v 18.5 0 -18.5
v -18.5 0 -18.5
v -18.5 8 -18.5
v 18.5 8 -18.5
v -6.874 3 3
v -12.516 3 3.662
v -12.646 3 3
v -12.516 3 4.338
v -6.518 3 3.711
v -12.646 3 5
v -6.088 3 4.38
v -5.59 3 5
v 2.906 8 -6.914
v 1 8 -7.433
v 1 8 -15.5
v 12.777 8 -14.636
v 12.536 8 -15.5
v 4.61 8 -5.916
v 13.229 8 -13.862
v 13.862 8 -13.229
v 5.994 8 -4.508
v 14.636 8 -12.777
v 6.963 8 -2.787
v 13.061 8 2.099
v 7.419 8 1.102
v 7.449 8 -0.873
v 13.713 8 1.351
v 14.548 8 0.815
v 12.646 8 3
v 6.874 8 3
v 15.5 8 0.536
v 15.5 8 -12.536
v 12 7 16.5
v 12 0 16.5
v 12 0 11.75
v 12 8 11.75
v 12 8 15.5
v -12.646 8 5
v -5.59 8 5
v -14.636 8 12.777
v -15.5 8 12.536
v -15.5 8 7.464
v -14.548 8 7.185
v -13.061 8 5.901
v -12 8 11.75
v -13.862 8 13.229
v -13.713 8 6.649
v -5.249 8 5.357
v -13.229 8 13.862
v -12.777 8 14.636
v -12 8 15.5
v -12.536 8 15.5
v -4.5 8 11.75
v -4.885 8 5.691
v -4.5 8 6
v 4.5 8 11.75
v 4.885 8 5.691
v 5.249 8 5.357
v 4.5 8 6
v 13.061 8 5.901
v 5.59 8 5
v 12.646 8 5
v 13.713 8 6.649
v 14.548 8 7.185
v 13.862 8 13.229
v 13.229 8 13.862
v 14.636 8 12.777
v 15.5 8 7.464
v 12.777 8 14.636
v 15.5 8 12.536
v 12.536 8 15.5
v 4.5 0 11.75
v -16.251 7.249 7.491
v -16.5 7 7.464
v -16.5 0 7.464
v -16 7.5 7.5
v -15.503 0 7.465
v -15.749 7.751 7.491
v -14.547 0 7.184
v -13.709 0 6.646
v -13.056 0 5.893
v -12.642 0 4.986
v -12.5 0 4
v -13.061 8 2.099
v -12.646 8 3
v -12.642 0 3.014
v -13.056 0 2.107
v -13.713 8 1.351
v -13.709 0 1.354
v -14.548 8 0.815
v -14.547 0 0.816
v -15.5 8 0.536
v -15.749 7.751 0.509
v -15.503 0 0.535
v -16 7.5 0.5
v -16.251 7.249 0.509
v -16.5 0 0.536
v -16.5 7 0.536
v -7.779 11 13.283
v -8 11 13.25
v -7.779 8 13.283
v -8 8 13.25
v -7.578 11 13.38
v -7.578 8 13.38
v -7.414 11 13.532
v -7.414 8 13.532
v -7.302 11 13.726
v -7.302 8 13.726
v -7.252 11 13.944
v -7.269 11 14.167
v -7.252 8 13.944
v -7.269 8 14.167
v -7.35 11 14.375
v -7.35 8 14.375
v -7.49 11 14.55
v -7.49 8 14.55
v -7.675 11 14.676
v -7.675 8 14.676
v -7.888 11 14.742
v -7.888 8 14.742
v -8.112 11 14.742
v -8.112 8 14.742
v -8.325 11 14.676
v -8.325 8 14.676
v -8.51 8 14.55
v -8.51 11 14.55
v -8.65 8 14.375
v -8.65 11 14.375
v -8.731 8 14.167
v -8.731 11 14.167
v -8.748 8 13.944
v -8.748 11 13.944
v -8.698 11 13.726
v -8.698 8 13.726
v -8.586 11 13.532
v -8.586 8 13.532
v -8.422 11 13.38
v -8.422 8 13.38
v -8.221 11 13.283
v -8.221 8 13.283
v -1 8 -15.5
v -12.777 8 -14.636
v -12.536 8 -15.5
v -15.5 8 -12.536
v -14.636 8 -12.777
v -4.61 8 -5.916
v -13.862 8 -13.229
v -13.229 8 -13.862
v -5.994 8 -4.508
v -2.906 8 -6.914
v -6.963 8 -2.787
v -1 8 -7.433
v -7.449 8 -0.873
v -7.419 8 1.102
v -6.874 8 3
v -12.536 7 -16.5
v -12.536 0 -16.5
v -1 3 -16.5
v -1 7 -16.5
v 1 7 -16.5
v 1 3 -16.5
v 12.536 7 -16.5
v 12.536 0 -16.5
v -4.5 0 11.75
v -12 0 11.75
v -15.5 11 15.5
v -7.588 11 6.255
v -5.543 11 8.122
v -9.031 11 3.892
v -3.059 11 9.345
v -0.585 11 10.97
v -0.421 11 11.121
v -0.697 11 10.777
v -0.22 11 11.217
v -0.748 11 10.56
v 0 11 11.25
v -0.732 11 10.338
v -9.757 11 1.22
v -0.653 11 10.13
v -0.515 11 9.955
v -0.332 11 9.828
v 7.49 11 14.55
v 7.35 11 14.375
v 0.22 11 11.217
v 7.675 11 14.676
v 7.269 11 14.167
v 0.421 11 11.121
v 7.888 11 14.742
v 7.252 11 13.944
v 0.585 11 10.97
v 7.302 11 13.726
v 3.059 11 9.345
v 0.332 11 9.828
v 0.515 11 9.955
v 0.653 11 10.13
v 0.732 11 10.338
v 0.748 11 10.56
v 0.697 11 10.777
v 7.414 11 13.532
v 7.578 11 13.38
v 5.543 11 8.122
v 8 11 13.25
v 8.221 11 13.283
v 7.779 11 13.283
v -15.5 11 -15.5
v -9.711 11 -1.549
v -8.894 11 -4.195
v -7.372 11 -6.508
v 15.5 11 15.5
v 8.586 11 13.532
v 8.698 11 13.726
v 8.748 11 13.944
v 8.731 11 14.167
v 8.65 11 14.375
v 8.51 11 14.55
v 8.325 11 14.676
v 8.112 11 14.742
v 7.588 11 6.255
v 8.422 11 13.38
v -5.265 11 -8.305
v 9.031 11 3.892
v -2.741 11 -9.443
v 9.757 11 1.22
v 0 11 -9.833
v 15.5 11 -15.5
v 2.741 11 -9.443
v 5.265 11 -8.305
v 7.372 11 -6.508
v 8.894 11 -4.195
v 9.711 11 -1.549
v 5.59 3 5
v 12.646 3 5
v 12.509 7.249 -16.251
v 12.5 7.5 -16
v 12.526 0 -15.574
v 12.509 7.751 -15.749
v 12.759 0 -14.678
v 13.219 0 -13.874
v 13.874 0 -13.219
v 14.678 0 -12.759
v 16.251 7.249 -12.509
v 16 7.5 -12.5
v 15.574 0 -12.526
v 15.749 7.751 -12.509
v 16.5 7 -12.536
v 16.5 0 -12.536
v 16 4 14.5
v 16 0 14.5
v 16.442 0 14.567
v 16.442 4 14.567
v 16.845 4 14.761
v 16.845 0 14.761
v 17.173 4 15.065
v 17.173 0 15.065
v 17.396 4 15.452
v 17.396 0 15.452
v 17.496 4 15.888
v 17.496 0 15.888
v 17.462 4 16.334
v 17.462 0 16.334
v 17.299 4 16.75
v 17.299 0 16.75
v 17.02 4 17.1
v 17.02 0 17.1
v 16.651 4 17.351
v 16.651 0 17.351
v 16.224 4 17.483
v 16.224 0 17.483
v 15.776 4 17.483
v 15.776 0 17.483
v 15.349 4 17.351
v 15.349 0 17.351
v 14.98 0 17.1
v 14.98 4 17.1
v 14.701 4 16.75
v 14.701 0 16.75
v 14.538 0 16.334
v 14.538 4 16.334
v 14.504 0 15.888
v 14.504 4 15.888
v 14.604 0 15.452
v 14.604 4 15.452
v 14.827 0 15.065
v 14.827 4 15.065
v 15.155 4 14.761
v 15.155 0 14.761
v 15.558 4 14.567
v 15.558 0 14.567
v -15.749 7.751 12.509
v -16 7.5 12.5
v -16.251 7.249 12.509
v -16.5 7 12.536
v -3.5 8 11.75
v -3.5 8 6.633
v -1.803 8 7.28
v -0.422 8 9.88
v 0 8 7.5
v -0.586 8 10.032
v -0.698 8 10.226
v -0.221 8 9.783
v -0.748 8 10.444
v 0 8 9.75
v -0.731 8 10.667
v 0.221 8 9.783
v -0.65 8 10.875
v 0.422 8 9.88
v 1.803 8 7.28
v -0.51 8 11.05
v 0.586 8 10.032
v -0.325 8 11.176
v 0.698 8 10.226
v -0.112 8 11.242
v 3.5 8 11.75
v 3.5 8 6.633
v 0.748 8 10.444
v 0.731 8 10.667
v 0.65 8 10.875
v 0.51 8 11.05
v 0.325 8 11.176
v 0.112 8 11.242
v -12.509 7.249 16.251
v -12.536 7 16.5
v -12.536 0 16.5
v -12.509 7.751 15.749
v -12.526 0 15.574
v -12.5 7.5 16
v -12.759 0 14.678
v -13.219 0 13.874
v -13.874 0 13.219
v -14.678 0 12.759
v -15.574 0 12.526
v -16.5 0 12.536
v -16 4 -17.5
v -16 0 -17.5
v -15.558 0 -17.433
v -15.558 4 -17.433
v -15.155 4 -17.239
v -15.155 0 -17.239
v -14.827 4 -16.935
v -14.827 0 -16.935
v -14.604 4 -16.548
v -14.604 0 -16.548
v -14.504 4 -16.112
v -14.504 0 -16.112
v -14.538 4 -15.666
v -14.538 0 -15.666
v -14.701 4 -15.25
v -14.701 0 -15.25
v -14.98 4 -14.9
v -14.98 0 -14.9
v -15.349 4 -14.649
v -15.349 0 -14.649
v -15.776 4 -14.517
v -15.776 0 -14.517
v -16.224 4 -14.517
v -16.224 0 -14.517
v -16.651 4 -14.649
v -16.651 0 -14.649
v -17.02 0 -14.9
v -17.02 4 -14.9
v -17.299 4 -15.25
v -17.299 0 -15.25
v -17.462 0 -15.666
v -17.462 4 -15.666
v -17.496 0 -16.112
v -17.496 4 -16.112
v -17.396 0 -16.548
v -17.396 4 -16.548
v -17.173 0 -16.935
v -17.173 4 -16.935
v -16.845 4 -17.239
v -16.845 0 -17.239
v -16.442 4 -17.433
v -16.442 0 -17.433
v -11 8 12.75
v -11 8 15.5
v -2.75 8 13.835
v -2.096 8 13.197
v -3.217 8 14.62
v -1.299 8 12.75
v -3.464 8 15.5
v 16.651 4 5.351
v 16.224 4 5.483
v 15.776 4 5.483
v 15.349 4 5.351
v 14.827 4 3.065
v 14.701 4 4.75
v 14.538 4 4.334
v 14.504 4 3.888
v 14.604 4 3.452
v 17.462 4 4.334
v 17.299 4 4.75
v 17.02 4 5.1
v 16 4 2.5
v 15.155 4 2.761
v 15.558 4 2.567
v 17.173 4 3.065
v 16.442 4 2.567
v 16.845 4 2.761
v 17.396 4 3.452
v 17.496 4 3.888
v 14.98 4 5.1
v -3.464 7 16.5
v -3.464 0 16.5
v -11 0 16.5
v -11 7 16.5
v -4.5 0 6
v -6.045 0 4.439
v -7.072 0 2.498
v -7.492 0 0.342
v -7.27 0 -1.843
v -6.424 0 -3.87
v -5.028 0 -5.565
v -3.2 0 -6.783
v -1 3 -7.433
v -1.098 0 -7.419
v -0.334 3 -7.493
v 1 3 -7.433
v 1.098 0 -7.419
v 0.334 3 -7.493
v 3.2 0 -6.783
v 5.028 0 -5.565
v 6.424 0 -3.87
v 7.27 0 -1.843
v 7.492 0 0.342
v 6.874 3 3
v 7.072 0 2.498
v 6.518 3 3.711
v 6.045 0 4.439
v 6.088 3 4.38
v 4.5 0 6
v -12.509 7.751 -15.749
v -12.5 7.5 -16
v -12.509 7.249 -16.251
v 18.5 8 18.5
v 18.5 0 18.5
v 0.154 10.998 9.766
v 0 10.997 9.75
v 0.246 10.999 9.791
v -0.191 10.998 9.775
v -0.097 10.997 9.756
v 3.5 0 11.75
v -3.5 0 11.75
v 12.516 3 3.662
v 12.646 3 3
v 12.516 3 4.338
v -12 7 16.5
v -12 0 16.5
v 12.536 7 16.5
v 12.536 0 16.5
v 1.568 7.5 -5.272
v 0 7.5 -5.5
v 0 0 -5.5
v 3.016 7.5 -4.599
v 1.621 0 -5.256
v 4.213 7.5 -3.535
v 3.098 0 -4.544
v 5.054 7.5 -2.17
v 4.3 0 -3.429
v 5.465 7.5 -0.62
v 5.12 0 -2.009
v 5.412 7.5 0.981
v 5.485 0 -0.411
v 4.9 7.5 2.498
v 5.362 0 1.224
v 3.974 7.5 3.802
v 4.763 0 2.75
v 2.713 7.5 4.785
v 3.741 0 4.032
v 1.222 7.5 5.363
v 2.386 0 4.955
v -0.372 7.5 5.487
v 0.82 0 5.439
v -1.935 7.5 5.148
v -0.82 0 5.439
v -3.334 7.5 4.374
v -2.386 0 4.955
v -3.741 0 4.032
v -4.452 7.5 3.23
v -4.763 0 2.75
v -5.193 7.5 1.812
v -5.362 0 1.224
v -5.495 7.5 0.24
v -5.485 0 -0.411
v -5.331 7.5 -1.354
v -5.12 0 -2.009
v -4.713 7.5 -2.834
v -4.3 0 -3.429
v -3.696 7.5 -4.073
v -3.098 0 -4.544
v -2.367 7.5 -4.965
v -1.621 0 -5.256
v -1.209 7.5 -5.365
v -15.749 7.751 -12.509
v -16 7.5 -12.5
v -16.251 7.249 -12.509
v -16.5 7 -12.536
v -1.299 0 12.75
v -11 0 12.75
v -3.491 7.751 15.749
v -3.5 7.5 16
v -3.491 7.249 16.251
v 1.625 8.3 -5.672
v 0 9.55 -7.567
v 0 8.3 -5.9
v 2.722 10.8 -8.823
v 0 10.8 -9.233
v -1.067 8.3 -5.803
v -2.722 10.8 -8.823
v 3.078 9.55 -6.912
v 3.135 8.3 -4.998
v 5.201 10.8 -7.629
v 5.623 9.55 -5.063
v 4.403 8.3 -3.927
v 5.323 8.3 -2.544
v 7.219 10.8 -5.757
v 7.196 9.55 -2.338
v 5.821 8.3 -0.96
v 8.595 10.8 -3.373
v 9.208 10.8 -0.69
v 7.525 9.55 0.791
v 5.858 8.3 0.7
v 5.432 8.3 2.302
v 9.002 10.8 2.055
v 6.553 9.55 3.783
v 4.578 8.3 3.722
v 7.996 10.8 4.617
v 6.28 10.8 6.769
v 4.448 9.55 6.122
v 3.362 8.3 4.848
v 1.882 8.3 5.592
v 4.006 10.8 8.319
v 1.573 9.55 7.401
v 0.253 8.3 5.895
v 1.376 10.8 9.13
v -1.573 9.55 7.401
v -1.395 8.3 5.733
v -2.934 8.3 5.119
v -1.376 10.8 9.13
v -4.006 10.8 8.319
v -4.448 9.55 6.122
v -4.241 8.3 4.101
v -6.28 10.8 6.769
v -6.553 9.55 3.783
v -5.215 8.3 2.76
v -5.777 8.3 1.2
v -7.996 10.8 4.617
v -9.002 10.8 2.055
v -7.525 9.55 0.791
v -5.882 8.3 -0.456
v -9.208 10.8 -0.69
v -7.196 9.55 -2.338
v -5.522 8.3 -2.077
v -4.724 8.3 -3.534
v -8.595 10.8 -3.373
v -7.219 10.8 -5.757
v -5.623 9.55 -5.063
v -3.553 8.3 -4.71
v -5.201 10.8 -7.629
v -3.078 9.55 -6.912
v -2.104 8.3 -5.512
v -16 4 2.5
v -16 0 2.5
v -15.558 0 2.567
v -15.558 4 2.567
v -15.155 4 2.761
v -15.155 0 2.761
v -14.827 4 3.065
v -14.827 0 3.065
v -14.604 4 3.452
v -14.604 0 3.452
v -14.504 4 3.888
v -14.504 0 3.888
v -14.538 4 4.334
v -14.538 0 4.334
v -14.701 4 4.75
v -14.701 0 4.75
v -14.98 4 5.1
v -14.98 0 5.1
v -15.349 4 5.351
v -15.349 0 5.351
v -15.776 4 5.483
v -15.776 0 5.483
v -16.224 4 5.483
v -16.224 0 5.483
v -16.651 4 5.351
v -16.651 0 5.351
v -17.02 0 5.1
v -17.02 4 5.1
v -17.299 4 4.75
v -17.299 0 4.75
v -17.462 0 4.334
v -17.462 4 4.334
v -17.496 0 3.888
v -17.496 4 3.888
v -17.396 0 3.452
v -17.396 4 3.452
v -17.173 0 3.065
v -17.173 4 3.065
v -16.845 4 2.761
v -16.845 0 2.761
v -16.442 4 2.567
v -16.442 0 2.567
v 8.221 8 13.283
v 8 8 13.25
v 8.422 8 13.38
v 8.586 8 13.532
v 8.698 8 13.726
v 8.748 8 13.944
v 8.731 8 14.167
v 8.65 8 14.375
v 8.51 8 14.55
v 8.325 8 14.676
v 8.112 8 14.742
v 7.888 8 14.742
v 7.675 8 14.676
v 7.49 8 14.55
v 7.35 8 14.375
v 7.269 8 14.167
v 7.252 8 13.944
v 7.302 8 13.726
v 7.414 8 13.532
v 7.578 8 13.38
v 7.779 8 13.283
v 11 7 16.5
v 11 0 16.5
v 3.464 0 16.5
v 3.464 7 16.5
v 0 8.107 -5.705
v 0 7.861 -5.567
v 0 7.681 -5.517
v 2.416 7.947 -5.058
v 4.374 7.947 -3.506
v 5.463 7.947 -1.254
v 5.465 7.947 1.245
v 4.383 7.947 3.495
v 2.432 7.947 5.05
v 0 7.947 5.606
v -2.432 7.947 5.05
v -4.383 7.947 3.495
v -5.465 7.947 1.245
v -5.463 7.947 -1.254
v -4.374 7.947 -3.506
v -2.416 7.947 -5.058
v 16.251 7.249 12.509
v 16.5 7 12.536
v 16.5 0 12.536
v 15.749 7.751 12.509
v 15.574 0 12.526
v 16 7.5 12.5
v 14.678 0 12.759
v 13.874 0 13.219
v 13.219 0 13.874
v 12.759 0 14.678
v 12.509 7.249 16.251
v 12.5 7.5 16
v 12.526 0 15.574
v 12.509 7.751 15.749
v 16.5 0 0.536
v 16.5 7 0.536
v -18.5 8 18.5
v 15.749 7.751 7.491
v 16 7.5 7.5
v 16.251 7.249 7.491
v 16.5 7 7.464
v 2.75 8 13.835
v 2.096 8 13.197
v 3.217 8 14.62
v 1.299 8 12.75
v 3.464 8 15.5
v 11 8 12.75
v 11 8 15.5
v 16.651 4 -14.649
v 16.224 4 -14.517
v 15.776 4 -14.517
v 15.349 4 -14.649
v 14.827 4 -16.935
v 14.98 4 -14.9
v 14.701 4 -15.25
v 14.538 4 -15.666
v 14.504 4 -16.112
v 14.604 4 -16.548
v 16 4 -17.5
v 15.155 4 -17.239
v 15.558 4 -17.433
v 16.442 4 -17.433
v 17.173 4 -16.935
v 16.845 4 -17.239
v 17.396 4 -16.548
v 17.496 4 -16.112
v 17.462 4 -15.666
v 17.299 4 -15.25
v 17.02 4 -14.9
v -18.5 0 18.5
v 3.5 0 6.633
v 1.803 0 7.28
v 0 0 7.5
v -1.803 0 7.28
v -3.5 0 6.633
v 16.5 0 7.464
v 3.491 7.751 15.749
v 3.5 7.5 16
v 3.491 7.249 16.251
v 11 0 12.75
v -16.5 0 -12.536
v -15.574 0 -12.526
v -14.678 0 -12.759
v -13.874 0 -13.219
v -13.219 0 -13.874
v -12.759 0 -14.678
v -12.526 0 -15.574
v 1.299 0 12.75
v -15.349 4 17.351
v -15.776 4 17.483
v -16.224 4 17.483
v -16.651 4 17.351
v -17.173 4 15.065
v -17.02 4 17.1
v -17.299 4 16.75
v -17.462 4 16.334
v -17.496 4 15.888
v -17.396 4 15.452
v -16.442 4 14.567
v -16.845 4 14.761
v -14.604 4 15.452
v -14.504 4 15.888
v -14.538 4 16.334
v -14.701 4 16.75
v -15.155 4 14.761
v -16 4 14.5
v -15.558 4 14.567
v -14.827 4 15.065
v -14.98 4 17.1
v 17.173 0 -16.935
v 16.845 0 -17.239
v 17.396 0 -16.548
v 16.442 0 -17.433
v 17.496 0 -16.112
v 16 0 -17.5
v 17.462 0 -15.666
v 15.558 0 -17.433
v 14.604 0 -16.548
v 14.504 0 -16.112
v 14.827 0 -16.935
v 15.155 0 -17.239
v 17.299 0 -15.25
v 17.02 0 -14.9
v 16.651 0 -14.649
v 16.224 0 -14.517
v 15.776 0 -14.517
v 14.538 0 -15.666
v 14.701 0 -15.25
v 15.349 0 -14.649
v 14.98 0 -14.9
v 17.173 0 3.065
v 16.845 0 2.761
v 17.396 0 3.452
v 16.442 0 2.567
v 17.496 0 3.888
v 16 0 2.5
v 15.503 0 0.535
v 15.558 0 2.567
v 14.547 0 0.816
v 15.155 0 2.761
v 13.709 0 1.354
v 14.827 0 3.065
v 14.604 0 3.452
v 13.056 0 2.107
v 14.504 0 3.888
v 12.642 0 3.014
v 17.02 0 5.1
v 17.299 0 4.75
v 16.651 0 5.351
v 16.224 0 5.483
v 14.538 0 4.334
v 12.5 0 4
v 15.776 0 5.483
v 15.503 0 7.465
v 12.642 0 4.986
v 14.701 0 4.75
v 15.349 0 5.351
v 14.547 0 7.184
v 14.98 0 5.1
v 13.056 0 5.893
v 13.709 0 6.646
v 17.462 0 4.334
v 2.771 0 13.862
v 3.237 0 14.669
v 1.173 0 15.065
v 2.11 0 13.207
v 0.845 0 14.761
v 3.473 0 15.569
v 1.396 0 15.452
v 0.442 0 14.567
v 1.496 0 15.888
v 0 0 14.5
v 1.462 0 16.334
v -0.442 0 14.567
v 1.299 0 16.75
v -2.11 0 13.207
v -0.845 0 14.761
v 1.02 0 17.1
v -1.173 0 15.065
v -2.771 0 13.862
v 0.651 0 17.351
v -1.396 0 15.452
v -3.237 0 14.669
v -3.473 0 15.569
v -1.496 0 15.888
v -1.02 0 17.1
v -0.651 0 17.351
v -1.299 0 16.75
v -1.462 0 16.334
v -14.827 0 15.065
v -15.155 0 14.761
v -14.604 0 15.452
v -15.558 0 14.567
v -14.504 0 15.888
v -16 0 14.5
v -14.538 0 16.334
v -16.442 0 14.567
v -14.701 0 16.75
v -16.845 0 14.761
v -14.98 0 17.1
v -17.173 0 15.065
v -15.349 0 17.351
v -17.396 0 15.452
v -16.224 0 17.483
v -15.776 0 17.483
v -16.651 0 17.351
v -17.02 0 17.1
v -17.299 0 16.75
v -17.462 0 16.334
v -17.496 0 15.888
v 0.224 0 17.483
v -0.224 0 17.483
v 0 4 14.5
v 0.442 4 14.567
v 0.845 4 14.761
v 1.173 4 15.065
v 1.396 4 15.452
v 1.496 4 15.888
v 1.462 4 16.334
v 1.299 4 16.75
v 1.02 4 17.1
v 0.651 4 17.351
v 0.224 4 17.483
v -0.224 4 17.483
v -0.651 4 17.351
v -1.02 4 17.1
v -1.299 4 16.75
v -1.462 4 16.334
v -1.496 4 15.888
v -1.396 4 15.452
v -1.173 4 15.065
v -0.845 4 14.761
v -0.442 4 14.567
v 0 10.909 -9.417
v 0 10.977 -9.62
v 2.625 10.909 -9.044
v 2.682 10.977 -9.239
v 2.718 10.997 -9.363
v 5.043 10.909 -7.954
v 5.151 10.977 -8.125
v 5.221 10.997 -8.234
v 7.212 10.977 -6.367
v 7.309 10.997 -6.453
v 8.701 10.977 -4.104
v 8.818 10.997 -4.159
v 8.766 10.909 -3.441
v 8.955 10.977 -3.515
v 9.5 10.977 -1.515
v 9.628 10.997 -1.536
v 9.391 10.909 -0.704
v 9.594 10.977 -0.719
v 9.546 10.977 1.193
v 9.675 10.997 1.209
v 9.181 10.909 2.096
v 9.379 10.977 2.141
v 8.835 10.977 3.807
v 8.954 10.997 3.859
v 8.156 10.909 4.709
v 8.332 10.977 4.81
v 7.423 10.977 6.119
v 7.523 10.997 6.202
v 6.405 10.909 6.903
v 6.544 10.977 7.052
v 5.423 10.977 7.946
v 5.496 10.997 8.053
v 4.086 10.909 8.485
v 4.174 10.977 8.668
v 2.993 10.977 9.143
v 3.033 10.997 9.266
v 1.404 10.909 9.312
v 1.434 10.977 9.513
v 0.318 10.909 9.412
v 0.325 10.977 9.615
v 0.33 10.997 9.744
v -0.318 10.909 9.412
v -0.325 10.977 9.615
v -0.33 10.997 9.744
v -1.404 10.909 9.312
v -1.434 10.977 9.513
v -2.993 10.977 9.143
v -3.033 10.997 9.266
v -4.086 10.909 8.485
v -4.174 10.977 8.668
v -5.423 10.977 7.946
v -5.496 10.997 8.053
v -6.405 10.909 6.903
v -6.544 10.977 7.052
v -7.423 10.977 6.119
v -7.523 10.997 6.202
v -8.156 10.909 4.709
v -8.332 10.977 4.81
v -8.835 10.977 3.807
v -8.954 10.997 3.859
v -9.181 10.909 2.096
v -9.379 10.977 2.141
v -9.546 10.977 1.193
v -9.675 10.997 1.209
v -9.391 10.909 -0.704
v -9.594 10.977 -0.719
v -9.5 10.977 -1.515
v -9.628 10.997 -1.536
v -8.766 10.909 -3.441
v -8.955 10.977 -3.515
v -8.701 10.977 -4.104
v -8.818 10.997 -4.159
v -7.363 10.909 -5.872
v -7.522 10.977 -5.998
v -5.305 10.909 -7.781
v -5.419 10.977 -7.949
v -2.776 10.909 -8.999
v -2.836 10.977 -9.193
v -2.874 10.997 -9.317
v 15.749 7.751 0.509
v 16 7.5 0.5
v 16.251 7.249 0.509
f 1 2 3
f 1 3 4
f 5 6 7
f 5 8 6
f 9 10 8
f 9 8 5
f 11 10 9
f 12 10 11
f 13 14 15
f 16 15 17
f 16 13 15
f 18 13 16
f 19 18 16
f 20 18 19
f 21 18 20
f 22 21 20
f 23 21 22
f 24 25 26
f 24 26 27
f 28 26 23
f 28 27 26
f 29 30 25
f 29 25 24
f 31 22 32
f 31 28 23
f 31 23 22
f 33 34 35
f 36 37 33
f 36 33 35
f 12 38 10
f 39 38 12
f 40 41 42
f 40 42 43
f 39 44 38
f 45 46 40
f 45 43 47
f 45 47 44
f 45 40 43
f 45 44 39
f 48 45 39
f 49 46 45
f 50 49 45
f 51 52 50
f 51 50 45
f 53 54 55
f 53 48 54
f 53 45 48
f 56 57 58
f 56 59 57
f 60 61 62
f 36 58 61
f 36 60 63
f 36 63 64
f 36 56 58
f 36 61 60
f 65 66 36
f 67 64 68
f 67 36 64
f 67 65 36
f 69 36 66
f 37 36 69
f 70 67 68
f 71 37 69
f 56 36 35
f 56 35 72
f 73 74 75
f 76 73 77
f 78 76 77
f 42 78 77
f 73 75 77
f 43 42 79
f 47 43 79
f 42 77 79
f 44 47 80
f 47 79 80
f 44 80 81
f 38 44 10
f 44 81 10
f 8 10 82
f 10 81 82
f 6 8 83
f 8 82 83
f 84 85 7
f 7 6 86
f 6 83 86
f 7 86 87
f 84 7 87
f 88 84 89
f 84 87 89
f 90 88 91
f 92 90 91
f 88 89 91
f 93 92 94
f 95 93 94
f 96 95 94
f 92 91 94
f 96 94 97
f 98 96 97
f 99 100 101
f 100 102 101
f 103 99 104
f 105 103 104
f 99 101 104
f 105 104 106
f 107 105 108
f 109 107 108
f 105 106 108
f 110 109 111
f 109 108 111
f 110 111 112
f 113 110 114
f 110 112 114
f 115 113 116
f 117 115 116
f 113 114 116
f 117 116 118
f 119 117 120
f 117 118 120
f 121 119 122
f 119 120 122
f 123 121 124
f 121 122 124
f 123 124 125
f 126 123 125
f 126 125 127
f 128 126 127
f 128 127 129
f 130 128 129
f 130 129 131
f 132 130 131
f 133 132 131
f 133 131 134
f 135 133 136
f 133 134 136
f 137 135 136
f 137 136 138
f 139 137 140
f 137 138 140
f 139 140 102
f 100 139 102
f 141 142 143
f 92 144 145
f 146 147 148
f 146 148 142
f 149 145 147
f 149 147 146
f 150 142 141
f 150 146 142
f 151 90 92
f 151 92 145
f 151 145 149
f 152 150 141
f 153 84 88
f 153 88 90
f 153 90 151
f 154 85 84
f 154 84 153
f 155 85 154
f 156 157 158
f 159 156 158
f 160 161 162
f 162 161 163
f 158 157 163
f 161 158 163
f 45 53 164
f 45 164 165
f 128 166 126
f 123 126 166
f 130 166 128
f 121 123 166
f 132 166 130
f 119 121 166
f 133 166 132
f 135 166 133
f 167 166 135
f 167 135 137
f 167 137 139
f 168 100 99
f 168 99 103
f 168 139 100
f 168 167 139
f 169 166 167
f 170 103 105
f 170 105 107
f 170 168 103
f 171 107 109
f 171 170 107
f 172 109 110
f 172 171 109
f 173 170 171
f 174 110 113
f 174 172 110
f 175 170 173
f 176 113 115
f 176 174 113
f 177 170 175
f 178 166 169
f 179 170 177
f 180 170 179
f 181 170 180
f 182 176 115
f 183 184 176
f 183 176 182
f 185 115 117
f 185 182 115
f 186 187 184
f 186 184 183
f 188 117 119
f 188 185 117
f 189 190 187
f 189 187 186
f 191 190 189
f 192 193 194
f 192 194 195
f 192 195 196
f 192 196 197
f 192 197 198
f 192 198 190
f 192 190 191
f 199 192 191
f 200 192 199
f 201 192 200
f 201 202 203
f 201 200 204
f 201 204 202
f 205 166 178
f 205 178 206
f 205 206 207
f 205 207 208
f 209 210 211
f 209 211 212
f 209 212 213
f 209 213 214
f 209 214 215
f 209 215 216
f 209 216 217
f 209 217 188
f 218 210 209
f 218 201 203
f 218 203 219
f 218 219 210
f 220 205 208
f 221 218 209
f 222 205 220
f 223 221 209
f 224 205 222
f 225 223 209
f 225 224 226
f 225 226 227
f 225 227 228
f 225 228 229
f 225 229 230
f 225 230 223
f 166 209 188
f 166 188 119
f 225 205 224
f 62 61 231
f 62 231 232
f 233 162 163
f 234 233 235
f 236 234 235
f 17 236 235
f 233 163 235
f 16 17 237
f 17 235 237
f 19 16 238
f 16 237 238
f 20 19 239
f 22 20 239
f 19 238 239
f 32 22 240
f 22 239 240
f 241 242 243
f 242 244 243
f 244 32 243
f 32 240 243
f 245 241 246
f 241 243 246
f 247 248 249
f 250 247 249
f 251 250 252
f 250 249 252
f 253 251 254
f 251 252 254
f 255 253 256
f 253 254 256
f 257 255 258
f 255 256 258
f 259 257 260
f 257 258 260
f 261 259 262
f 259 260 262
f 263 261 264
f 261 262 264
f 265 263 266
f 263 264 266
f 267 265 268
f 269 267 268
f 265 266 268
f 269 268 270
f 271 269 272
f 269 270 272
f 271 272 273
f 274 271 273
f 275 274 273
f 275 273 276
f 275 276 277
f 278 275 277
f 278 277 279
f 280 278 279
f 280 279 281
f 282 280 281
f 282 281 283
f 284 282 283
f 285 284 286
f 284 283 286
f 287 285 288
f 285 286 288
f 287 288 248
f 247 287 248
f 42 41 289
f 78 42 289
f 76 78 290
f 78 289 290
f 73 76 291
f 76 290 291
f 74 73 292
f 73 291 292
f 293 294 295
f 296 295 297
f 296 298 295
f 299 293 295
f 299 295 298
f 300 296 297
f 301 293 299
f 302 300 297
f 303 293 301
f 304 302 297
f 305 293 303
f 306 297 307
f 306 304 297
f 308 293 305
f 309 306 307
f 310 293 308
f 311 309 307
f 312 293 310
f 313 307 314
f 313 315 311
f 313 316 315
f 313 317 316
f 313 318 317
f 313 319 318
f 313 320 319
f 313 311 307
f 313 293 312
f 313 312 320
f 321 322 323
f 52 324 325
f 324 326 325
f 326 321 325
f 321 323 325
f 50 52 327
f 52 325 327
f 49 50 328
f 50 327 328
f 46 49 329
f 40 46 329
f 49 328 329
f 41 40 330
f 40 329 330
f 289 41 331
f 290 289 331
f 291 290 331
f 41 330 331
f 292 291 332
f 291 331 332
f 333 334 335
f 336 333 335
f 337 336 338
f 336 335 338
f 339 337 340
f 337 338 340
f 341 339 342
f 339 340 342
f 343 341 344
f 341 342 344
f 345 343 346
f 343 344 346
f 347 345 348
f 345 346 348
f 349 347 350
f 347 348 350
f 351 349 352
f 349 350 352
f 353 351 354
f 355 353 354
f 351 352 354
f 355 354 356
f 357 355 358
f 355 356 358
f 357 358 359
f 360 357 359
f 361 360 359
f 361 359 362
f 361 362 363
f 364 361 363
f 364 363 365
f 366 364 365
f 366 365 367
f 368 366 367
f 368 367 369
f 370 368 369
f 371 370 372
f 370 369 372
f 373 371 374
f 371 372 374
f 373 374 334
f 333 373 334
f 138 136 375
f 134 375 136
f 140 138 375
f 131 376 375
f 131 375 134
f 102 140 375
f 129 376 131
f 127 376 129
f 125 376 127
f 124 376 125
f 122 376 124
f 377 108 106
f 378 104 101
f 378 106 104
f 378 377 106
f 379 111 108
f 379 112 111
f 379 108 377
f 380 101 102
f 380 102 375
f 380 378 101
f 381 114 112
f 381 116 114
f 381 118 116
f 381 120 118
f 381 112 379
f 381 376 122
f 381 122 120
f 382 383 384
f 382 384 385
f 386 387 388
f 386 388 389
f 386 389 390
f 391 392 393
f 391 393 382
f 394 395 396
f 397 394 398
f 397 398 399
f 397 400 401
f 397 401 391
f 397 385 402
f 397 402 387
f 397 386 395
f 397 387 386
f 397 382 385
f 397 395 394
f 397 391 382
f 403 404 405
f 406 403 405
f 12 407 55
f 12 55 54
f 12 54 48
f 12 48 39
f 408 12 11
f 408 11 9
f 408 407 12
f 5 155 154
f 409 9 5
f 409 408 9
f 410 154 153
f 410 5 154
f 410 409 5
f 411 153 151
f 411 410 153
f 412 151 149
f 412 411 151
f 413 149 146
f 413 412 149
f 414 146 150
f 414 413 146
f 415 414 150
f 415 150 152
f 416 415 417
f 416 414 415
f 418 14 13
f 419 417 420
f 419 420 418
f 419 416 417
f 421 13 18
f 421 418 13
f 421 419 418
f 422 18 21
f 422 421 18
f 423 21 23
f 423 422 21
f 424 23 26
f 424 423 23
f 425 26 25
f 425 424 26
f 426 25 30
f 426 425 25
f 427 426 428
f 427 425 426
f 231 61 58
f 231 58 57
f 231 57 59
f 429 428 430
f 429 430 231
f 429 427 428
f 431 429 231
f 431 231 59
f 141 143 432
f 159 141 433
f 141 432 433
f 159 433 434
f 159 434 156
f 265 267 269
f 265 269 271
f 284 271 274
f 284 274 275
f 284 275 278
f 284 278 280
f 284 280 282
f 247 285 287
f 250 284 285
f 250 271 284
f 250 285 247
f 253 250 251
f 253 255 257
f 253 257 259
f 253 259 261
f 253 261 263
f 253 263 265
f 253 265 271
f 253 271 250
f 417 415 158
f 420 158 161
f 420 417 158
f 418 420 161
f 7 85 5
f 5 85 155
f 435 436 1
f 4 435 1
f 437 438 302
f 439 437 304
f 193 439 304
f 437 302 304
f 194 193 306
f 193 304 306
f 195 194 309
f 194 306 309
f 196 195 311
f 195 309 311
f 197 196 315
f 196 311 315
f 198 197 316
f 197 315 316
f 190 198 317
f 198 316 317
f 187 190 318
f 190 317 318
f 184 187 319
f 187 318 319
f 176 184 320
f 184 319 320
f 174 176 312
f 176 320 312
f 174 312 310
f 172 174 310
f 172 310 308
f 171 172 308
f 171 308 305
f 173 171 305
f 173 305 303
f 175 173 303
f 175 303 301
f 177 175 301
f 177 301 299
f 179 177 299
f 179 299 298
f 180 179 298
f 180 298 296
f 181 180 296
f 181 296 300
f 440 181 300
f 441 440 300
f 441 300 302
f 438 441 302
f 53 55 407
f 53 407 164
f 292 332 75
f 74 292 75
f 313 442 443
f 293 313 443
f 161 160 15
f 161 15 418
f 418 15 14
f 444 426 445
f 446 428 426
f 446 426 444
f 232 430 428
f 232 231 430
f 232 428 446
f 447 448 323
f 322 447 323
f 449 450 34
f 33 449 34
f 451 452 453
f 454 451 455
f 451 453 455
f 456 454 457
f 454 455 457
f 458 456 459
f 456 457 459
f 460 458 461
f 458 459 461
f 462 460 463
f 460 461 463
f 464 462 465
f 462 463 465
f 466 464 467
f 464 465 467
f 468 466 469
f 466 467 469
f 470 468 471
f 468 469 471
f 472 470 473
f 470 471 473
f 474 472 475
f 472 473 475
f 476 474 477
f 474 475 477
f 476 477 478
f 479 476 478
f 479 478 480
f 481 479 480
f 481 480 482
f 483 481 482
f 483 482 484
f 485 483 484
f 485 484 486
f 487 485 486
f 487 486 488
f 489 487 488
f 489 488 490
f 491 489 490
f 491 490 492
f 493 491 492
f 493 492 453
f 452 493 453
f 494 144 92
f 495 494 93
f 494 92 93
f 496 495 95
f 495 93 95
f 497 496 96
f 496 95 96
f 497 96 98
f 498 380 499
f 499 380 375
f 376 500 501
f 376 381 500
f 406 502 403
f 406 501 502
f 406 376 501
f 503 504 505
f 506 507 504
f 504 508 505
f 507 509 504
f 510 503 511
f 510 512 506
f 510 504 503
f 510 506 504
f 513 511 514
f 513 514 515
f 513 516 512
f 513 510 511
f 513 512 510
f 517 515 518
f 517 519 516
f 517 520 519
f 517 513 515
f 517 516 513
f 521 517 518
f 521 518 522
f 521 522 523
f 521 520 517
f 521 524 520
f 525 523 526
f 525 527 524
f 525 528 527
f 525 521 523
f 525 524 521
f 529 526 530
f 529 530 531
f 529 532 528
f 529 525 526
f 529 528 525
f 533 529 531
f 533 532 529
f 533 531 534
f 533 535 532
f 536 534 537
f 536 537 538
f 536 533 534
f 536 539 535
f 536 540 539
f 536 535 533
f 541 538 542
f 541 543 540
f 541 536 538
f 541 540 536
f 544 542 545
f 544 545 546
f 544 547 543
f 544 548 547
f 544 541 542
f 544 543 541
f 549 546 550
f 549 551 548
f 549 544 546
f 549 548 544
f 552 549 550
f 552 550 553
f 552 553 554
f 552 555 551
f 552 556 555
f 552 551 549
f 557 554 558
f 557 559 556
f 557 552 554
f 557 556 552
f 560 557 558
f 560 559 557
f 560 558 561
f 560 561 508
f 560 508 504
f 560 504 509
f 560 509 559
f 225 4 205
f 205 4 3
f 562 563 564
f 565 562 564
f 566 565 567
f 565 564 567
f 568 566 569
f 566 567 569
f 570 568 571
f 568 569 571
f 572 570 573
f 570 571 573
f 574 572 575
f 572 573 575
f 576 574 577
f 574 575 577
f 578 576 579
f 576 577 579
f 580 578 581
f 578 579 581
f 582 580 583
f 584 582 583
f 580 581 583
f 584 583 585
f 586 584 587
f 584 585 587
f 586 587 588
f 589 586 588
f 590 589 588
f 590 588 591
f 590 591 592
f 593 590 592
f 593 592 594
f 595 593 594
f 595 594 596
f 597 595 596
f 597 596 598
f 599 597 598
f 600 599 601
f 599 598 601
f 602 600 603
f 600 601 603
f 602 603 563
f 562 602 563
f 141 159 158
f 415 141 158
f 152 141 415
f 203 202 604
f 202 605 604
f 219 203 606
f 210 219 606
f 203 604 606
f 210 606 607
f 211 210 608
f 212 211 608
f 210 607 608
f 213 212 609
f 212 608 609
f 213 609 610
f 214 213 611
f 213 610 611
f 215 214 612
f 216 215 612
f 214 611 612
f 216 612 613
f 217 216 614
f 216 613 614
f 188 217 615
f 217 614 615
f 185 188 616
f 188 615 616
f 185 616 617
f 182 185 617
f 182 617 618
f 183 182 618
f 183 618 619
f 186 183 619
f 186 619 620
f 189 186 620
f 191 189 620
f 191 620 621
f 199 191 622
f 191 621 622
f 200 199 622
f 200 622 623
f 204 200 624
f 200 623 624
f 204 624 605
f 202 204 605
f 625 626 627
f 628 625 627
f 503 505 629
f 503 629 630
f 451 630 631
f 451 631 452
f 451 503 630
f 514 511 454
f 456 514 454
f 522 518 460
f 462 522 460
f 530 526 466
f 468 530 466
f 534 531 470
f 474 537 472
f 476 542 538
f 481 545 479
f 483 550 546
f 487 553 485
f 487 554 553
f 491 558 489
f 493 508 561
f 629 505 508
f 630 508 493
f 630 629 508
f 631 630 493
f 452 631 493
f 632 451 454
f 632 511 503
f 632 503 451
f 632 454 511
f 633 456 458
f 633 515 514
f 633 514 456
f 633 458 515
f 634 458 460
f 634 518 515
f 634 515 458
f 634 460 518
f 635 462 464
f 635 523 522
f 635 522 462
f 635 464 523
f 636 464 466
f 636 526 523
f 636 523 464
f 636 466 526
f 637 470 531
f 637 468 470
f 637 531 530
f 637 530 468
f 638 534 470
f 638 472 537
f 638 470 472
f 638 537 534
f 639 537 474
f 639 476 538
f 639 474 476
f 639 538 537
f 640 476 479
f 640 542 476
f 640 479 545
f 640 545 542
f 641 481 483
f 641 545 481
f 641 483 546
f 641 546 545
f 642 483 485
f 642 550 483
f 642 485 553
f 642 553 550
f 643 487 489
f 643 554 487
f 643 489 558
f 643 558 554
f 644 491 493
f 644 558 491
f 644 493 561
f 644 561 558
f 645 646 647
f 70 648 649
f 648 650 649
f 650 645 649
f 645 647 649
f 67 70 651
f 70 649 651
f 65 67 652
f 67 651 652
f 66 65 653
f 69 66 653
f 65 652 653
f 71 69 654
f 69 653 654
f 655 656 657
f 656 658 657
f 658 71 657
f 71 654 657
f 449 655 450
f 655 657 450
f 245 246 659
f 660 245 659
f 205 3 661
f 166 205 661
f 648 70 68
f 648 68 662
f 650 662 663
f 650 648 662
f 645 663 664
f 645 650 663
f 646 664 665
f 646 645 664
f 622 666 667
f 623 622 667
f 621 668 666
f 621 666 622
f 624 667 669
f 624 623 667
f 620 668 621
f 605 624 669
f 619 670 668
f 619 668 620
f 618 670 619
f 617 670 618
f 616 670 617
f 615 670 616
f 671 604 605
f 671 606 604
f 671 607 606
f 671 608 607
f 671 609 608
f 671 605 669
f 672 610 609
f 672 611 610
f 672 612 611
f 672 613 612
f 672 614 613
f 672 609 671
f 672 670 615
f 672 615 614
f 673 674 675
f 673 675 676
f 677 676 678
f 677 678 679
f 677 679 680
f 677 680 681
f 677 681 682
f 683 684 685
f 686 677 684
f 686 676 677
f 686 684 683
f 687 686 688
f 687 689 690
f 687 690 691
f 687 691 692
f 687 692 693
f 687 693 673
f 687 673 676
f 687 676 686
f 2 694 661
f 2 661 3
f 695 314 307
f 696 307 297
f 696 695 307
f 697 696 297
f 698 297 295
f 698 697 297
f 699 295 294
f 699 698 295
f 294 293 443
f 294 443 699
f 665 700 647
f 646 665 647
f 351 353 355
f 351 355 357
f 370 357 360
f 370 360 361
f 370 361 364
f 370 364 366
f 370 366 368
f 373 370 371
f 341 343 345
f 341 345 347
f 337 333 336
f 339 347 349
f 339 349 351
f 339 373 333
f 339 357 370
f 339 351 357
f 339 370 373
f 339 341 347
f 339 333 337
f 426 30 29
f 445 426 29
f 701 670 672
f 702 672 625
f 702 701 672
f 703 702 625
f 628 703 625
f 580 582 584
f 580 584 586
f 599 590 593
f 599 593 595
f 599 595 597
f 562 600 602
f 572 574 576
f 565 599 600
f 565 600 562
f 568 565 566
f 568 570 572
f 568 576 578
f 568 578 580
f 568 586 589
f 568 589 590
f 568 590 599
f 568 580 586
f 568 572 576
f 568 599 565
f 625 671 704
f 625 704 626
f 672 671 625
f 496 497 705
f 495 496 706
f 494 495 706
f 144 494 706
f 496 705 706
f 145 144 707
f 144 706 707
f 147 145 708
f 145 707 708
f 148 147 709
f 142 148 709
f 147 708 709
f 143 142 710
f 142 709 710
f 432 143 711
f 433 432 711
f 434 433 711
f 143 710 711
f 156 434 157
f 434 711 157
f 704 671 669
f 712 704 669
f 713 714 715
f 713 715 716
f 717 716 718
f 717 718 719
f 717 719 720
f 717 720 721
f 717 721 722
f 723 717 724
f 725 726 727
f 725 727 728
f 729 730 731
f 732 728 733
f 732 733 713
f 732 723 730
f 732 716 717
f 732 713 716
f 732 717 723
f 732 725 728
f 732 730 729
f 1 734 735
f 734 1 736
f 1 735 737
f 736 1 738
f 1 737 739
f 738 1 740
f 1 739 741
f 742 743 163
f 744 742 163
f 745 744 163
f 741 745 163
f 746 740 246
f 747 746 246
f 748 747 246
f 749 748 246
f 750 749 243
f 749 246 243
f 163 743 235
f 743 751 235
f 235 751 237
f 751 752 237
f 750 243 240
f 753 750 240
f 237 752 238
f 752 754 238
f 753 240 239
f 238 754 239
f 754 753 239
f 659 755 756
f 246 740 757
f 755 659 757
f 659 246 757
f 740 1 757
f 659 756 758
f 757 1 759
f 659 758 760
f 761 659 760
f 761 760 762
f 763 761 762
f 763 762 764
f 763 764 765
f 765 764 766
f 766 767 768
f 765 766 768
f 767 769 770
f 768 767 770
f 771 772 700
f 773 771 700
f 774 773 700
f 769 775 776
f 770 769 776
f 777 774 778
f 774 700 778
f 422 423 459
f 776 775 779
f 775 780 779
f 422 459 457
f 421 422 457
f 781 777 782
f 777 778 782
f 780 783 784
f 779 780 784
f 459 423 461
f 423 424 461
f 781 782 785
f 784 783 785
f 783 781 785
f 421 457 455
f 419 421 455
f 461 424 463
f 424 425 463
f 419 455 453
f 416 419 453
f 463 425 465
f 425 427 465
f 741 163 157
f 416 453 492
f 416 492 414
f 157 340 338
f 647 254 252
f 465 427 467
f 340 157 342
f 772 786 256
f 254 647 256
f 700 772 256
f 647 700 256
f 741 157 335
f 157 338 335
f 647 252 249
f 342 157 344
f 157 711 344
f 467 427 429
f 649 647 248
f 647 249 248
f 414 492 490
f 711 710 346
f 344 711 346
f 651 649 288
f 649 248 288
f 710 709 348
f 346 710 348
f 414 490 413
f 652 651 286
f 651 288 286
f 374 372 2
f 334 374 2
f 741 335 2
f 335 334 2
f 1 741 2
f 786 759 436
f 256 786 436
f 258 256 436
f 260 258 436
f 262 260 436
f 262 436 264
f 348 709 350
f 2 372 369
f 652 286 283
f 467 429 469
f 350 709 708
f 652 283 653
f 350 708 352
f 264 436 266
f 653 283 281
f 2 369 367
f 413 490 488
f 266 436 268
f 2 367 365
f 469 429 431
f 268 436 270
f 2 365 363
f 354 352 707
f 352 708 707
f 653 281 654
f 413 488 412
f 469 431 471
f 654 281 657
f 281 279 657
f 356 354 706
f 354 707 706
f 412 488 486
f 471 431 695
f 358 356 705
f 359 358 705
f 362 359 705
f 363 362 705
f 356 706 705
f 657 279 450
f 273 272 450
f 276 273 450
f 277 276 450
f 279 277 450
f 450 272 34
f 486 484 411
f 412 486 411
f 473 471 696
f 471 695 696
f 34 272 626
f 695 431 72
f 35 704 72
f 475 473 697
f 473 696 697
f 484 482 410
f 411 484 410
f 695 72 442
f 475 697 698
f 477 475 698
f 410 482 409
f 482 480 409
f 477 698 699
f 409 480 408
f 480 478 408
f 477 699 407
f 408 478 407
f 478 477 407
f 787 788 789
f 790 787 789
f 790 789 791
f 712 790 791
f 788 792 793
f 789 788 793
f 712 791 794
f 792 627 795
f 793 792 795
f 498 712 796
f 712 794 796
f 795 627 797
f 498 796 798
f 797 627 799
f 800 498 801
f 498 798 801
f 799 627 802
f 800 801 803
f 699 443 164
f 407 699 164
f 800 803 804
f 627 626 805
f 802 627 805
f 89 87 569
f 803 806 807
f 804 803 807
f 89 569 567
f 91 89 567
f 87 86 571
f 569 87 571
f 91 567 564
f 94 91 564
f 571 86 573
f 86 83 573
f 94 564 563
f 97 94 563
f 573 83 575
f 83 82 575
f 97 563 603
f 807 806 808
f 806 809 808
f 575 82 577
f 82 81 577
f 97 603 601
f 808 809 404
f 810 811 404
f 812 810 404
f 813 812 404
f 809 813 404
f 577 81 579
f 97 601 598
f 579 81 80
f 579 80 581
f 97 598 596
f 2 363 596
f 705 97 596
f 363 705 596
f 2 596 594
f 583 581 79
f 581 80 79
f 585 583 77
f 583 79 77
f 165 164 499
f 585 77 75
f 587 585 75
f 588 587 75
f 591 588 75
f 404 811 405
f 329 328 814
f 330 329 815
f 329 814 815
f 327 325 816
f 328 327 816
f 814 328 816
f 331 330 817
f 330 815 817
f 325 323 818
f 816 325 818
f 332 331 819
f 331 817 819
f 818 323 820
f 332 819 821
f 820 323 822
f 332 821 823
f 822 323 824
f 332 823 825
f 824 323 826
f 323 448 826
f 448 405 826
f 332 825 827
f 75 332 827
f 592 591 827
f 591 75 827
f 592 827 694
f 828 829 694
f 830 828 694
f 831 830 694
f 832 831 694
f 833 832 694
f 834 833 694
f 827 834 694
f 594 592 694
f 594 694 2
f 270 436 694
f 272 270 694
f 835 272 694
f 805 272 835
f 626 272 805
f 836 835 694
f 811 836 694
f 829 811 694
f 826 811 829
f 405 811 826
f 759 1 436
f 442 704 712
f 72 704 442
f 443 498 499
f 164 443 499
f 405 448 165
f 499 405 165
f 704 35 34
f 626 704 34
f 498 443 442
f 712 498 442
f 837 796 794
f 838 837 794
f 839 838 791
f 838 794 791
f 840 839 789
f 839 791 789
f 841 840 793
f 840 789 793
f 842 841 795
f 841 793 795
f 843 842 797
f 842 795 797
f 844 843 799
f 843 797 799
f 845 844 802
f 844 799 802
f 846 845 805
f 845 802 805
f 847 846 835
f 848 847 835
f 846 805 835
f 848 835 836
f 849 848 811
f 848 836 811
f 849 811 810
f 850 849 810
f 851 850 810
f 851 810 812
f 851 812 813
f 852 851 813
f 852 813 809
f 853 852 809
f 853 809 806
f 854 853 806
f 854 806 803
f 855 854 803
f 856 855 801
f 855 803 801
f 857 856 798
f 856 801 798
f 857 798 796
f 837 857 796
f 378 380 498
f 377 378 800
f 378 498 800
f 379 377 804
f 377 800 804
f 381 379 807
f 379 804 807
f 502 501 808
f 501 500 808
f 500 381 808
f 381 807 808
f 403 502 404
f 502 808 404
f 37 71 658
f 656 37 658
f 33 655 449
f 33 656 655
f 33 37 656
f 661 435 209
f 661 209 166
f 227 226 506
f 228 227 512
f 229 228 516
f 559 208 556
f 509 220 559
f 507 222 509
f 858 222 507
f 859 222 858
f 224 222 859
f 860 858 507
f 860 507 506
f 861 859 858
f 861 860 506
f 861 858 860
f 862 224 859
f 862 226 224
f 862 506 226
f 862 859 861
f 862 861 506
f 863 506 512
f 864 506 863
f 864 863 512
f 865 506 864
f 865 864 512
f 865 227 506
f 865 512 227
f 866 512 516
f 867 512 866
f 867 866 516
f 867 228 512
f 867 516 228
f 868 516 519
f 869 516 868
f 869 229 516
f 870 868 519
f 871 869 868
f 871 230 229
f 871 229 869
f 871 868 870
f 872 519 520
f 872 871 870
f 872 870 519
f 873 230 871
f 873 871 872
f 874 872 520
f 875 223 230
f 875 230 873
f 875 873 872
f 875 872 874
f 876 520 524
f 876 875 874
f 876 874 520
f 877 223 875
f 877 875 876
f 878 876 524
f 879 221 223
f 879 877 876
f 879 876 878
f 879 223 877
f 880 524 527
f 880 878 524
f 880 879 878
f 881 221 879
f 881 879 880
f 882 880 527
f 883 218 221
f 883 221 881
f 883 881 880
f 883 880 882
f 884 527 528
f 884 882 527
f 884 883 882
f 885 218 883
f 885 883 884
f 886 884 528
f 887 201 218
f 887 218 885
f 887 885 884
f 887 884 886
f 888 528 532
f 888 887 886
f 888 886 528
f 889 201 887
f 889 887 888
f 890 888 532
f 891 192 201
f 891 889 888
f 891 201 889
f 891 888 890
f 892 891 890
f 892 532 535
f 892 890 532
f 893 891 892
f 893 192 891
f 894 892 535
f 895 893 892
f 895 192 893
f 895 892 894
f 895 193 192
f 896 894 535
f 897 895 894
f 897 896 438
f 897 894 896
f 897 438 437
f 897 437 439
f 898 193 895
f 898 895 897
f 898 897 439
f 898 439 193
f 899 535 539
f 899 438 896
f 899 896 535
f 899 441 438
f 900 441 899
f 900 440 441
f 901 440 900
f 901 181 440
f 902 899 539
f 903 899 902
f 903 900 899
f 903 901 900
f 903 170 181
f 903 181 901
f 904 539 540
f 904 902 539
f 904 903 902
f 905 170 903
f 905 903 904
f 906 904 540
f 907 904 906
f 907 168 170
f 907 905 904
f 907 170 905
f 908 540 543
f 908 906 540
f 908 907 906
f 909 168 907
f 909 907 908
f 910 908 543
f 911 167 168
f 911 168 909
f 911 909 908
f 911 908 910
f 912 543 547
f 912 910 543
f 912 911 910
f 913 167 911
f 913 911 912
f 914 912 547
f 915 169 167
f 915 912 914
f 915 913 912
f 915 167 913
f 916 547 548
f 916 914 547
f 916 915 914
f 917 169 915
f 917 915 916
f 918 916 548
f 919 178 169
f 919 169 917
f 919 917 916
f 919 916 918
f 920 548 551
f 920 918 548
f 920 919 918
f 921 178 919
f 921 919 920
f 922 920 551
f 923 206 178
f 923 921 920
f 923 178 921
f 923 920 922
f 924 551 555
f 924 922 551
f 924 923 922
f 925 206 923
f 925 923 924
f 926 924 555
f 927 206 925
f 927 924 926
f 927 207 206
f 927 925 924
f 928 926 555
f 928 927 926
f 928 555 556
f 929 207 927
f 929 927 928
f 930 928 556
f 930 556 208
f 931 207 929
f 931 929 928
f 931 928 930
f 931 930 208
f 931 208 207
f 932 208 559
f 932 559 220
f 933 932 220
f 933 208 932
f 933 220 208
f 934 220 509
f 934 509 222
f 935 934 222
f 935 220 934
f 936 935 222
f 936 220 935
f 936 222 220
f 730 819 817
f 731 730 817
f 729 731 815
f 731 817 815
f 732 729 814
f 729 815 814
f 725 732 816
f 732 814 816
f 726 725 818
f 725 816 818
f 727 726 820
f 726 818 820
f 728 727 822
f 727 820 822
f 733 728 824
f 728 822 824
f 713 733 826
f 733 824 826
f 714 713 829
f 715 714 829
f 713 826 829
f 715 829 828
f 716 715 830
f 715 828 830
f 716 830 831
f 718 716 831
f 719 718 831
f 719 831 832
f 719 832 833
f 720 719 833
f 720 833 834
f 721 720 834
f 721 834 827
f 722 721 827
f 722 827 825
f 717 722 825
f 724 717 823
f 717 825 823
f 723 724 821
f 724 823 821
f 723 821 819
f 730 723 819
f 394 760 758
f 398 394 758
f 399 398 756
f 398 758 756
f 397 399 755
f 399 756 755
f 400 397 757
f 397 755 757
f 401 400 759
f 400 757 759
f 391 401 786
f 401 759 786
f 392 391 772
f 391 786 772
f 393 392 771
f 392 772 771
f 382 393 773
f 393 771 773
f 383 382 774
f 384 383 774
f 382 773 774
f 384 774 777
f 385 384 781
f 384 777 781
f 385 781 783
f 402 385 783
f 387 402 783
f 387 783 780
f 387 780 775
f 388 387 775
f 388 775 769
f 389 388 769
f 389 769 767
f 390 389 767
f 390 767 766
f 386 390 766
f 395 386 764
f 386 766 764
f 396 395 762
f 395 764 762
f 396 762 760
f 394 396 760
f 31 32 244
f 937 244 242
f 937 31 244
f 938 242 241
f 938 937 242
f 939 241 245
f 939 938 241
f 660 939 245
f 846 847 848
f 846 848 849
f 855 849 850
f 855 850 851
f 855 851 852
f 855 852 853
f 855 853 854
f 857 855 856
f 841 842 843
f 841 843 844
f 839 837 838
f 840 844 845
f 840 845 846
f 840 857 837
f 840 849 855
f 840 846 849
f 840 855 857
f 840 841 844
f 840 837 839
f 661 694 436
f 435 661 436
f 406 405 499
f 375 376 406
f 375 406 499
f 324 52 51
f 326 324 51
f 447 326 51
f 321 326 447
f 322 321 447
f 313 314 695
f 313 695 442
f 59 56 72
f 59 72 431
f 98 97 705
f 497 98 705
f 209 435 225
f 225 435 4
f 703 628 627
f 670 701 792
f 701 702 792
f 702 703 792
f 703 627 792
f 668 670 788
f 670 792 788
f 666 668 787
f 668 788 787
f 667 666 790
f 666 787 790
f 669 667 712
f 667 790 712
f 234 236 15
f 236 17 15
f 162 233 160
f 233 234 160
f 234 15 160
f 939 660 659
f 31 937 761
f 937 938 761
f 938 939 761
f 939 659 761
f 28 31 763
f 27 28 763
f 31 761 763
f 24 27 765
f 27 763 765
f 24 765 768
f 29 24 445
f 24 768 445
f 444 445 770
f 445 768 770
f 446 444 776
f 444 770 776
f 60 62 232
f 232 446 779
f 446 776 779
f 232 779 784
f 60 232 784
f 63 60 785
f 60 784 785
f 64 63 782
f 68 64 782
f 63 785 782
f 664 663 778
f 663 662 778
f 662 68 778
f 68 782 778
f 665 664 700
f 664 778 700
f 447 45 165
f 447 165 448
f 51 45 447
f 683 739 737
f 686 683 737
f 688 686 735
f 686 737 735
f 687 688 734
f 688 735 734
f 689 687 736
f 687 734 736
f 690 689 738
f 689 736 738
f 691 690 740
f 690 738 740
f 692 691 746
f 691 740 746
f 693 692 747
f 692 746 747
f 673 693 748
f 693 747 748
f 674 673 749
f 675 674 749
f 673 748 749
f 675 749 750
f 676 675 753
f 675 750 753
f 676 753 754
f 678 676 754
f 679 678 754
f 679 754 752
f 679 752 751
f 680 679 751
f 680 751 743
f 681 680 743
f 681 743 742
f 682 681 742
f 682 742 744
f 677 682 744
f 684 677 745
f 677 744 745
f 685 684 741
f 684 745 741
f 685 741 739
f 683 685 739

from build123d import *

# Parameters (mm, degrees)
SKETCH_1_W          = 37
SKETCH_1_H          = 37
EXTRUDE_1_DEPTH     = 11
SKETCH_2_R          = 1.5
CUT_EXTRUDE_1_DEPTH = 4
SKETCH_3_R          = 5.5
CUT_EXTRUDE_2_DEPTH = 29.381331893
SKETCH_4_R          = 7.5
CUT_EXTRUDE_4_DEPTH = 8
SKETCH_5_R          = 0.75
CUT_EXTRUDE_5_DEPTH = 28.358728041
SKETCH_7_W          = 8.873163899
SKETCH_7_H          = 2
SKETCH_7_W_2        = 8.897226177
SKETCH_7_W_3        = 2
SKETCH_7_H_2        = 11.172985464
EXTRUDE_3_DEPTH     = 5
EXTRUDE_6_DEPTH     = 8
EXTRUDE_7_REACH     = 44.805
EXTRUDE_8_REACH     = 44.805
CHAMFER_2_SIZE      = 3
SKETCH_11_R         = 0.75
CUT_EXTRUDE_6_DEPTH = 28.358728041
CHAMFER_3_SIZE      = 3
CHAMFER_3_SIZE2     = 4
FILLET_1_R          = 1
FILLET_2_R          = 1


with BuildPart() as part:
    # 草图1 → 凸台-拉伸1 (new body)
    with BuildSketch(Plane(origin=(0, 0, 0), x_dir=(1, 0, 0), z_dir=(0, 1, 0))):
        Rectangle(SKETCH_1_W, SKETCH_1_H)
    extrude(amount=EXTRUDE_1_DEPTH)

    # 草图2 → 切除-拉伸1 (cut)
    with BuildSketch(Plane.XZ):
        with Locations(Location((-16, 16, 0), (0, 0, 270))):
            Circle(SKETCH_2_R)
        with Locations(Location((-16, -16, 0), (0, 0, 270))):
            Circle(SKETCH_2_R)
        with Locations(Location((16, 16, 0), (0, 0, 270))):
            Circle(SKETCH_2_R)
        with Locations(Location((16, -16, 0), (0, 0, 270))):
            Circle(SKETCH_2_R)
        with Locations(Location((16, 4, 0), (0, 0, 270))):
            Circle(SKETCH_2_R)
        with Locations(Location((-16, 4, 0), (0, 0, 270))):
            Circle(SKETCH_2_R)
        with Locations(Location((0, 16, 0), (0, 0, 270))):
            Circle(SKETCH_2_R)
    extrude(amount=-CUT_EXTRUDE_1_DEPTH, mode=Mode.SUBTRACT)

    # 草图3 → 切除-拉伸2 (cut, through all)
    with BuildSketch(Plane.XZ):
        with Locations(Location((0, 0, 0), (0, 0, 270))):
            Circle(SKETCH_3_R)
    extrude(amount=-CUT_EXTRUDE_2_DEPTH, mode=Mode.SUBTRACT)

    # 草图4 → 切除-拉伸4 (cut)
    with BuildSketch(Plane.XZ):
        with BuildLine():
            Line((-16.5, 0.535898385), (-16.5, -12.535898385))
            ThreePointArc((-16.5, -12.535898385), (-13.525126266, -13.525126266), (-12.535898385, -16.5))
            Line((-12.535898385, -16.5), (12.535898385, -16.5))
            ThreePointArc((12.535898385, -16.5), (13.525126266, -13.525126266), (16.5, -12.535898385))
            Line((16.5, -12.535898385), (16.5, 0.535898385))
            ThreePointArc((16.5, 0.535898385), (12.5, 4), (16.5, 7.464101615))
            Line((16.5, 7.464101615), (16.5, 12.535898385))
            ThreePointArc((16.5, 12.535898385), (13.525126266, 13.525126266), (12.535898385, 16.5))
            Line((12.535898385, 16.5), (3.464101615, 16.5))
            ThreePointArc((3.464101615, 16.5), (0, 12.5), (-3.464101615, 16.5))
            Line((-3.464101615, 16.5), (-12.535898385, 16.5))
            ThreePointArc((-12.535898385, 16.5), (-13.525126266, 13.525126266), (-16.5, 12.535898385))
            Line((-16.5, 12.535898385), (-16.5, 7.464101615))
            ThreePointArc((-16.5, 7.464101615), (-12.5, 4), (-16.5, 0.535898385))
        make_face()
        with Locations(Location((0, 0, 0), (0, 0, 270))):
            Circle(SKETCH_4_R, mode=Mode.SUBTRACT)
    extrude(amount=-CUT_EXTRUDE_4_DEPTH, mode=Mode.SUBTRACT)

    # 草图5 → 切除-拉伸5 (cut, through all)
    with BuildSketch(Plane.XZ.offset(-8)):
        with Locations(Location((-8, 14, 0), (0, 0, 270))):
            Circle(SKETCH_5_R)
        with Locations(Location((0, 10.5, 0), (0, 0, 270))):
            Circle(SKETCH_5_R)
        with Locations(Location((8, 14, 0), (0, 0, 270))):
            Circle(SKETCH_5_R)
    extrude(amount=-CUT_EXTRUDE_5_DEPTH, mode=Mode.SUBTRACT)

    # 草图7 → 凸台-拉伸3 (add)
    with BuildSketch(Plane.XZ.offset(-8)):
        with Locations((-9.263191889, 4)):
            Rectangle(SKETCH_7_W, SKETCH_7_H)
        with Locations((9.460856753, 4)):
            Rectangle(SKETCH_7_W_2, SKETCH_7_H)
        with Locations((0, -11.893119293)):
            Rectangle(SKETCH_7_W_3, SKETCH_7_H_2)
    extrude(amount=EXTRUDE_3_DEPTH)

    # 草图6 → 凸台-拉伸6 (add)
    with BuildSketch(Plane.XZ.offset(-8)):
        Polygon((-11, 12.75), (-3.5, 12.75), (3.5, 12.75), (11, 12.75), (11, 17.612391956), (12, 17.612391956), (12, 11.75), (4.5, 11.75), (4.5, 5.286247788), (3.5, 5.286247788), (3.5, 11.75), (-3.5, 11.75), (-3.5, 5.286247788), (-4.5, 5.286247788), (-4.5, 11.75), (-12, 11.75), (-12, 17.612391956), (-11, 17.612391956), align=None)
    extrude(amount=EXTRUDE_6_DEPTH)

    # 凸台-拉伸7: up to this face of the body (flat: up to its plane)
    extrude_7_end = Plane(part.part.faces().sort_by_distance((0, 5.5, -18.5))[0])
    # 草图9 → 凸台-拉伸7 (add, up to the picked face)
    with BuildSketch(Plane.XY.offset(18.5), mode=Mode.PRIVATE) as extrude_7_sk1:
        Polygon((-12.5, 11), (-18.5, 5), (-18.5, 11), align=None)
    extrude_7_tool1 = split(extrude(extrude_7_sk1.sketch, amount=-EXTRUDE_7_REACH, mode=Mode.PRIVATE), bisect_by=extrude_7_end, keep=Keep.BOTH, mode=Mode.PRIVATE)
    # 草图9 → 凸台-拉伸7 (add, up to the picked face)
    with BuildSketch(Plane.XY.offset(18.5), mode=Mode.PRIVATE) as extrude_7_sk2:
        Polygon((18.5, 11), (12.5, 11), (18.5, 5), align=None)
    extrude_7_tool2 = split(extrude(extrude_7_sk2.sketch, amount=-EXTRUDE_7_REACH, mode=Mode.PRIVATE), bisect_by=extrude_7_end, keep=Keep.BOTH, mode=Mode.PRIVATE)
    add(extrude_7_tool1.solids().sort_by(Axis((-16.5, 9, 18.5), (0, 0, -1)))[0])
    add(extrude_7_tool2.solids().sort_by(Axis((16.5, 9, 18.5), (0, 0, -1)))[0])

    # 凸台-拉伸8: up to this face of the body (flat: up to its plane)
    extrude_8_end = Plane(part.part.faces().sort_by_distance((18.5, 5.5, 0))[0])
    # 草图10 → 凸台-拉伸8 (add, up to the picked face)
    with BuildSketch(Plane.ZY.offset(18.5), mode=Mode.PRIVATE) as extrude_8_sk1:
        Polygon((-12.5, 11), (-18.5, 5), (-18.5, 11), align=None)
    extrude_8_tool1 = split(extrude(extrude_8_sk1.sketch, amount=-EXTRUDE_8_REACH, mode=Mode.PRIVATE), bisect_by=extrude_8_end, keep=Keep.BOTH, mode=Mode.PRIVATE)
    # 草图10 → 凸台-拉伸8 (add, up to the picked face)
    with BuildSketch(Plane.ZY.offset(18.5), mode=Mode.PRIVATE) as extrude_8_sk2:
        Polygon((18.5, 11), (12.5, 11), (18.5, 5), align=None)
    extrude_8_tool2 = split(extrude(extrude_8_sk2.sketch, amount=-EXTRUDE_8_REACH, mode=Mode.PRIVATE), bisect_by=extrude_8_end, keep=Keep.BOTH, mode=Mode.PRIVATE)
    add(extrude_8_tool1.solids().sort_by(Axis((-18.5, 9, -16.5), (1, 0, 0)))[0])
    add(extrude_8_tool2.solids().sort_by(Axis((-18.5, 9, 16.5), (1, 0, 0)))[0])

    # 倒角2
    chamfer_2_edges = [part.edges().sort_by_distance(p)[0] for p in [
        (-18.5, 11, 0),
        (0, 11, 18.5),
        (18.5, 11, 0),
        (0, 11, -18.5),
    ]]
    chamfer(chamfer_2_edges, length=CHAMFER_2_SIZE)

    # 草图11 → 切除-拉伸6 (cut, through all)
    with BuildSketch(Plane.XZ.offset(-8)):
        with Locations(Location((8, 14, 0), (0, 0, 270))):
            Circle(SKETCH_11_R)
        with Locations(Location((-8, 14, 0), (0, 0, 270))):
            Circle(SKETCH_11_R)
    extrude(amount=-CUT_EXTRUDE_6_DEPTH, mode=Mode.SUBTRACT)

    # 倒角3
    chamfer_3_edges = [part.edges().sort_by_distance(p)[0] for p in [
        (0, 11, 5.5),
    ]]
    chamfer_3_side = [part.faces().sort_by_distance(p)[0] for p in [
        (0, 5.5, 5.5),
    ]]
    chamfer(chamfer_3_edges, length=CHAMFER_3_SIZE, length2=CHAMFER_3_SIZE2, reference=chamfer_3_side[0])

    # 圆角1
    # the kernel refuses this fillet: 1 mm, written as the material it takes off along each edge
    with BuildSketch(Plane(origin=(0, 11, 0), x_dir=(0, 0, -1), z_dir=(-1, 0, 0))) as fillet_1_piece_1:
        with BuildLine():
            CenterArc((9.5 + FILLET_1_R * 0.333333333333, FILLET_1_R), FILLET_1_R, 233.130102354, 36.869897646)
            Line((9.5 - FILLET_1_R * 0.266666666667, FILLET_1_R * 0.2), (9.5, 0))
            Line((9.5, 0), (9.5 + FILLET_1_R * 0.333333333333, 0))
        make_face()
    revolve(axis=Axis((0, 11, 0), (0, -1, 0)), mode=Mode.SUBTRACT)

    # 圆角2
    fillet_2_edges = [part.edges().sort_by_distance(p)[0] for p in [
        (0, 8, 5.5),
    ]]
    fillet(fillet_2_edges, radius=FILLET_2_R)


solid = part.part
